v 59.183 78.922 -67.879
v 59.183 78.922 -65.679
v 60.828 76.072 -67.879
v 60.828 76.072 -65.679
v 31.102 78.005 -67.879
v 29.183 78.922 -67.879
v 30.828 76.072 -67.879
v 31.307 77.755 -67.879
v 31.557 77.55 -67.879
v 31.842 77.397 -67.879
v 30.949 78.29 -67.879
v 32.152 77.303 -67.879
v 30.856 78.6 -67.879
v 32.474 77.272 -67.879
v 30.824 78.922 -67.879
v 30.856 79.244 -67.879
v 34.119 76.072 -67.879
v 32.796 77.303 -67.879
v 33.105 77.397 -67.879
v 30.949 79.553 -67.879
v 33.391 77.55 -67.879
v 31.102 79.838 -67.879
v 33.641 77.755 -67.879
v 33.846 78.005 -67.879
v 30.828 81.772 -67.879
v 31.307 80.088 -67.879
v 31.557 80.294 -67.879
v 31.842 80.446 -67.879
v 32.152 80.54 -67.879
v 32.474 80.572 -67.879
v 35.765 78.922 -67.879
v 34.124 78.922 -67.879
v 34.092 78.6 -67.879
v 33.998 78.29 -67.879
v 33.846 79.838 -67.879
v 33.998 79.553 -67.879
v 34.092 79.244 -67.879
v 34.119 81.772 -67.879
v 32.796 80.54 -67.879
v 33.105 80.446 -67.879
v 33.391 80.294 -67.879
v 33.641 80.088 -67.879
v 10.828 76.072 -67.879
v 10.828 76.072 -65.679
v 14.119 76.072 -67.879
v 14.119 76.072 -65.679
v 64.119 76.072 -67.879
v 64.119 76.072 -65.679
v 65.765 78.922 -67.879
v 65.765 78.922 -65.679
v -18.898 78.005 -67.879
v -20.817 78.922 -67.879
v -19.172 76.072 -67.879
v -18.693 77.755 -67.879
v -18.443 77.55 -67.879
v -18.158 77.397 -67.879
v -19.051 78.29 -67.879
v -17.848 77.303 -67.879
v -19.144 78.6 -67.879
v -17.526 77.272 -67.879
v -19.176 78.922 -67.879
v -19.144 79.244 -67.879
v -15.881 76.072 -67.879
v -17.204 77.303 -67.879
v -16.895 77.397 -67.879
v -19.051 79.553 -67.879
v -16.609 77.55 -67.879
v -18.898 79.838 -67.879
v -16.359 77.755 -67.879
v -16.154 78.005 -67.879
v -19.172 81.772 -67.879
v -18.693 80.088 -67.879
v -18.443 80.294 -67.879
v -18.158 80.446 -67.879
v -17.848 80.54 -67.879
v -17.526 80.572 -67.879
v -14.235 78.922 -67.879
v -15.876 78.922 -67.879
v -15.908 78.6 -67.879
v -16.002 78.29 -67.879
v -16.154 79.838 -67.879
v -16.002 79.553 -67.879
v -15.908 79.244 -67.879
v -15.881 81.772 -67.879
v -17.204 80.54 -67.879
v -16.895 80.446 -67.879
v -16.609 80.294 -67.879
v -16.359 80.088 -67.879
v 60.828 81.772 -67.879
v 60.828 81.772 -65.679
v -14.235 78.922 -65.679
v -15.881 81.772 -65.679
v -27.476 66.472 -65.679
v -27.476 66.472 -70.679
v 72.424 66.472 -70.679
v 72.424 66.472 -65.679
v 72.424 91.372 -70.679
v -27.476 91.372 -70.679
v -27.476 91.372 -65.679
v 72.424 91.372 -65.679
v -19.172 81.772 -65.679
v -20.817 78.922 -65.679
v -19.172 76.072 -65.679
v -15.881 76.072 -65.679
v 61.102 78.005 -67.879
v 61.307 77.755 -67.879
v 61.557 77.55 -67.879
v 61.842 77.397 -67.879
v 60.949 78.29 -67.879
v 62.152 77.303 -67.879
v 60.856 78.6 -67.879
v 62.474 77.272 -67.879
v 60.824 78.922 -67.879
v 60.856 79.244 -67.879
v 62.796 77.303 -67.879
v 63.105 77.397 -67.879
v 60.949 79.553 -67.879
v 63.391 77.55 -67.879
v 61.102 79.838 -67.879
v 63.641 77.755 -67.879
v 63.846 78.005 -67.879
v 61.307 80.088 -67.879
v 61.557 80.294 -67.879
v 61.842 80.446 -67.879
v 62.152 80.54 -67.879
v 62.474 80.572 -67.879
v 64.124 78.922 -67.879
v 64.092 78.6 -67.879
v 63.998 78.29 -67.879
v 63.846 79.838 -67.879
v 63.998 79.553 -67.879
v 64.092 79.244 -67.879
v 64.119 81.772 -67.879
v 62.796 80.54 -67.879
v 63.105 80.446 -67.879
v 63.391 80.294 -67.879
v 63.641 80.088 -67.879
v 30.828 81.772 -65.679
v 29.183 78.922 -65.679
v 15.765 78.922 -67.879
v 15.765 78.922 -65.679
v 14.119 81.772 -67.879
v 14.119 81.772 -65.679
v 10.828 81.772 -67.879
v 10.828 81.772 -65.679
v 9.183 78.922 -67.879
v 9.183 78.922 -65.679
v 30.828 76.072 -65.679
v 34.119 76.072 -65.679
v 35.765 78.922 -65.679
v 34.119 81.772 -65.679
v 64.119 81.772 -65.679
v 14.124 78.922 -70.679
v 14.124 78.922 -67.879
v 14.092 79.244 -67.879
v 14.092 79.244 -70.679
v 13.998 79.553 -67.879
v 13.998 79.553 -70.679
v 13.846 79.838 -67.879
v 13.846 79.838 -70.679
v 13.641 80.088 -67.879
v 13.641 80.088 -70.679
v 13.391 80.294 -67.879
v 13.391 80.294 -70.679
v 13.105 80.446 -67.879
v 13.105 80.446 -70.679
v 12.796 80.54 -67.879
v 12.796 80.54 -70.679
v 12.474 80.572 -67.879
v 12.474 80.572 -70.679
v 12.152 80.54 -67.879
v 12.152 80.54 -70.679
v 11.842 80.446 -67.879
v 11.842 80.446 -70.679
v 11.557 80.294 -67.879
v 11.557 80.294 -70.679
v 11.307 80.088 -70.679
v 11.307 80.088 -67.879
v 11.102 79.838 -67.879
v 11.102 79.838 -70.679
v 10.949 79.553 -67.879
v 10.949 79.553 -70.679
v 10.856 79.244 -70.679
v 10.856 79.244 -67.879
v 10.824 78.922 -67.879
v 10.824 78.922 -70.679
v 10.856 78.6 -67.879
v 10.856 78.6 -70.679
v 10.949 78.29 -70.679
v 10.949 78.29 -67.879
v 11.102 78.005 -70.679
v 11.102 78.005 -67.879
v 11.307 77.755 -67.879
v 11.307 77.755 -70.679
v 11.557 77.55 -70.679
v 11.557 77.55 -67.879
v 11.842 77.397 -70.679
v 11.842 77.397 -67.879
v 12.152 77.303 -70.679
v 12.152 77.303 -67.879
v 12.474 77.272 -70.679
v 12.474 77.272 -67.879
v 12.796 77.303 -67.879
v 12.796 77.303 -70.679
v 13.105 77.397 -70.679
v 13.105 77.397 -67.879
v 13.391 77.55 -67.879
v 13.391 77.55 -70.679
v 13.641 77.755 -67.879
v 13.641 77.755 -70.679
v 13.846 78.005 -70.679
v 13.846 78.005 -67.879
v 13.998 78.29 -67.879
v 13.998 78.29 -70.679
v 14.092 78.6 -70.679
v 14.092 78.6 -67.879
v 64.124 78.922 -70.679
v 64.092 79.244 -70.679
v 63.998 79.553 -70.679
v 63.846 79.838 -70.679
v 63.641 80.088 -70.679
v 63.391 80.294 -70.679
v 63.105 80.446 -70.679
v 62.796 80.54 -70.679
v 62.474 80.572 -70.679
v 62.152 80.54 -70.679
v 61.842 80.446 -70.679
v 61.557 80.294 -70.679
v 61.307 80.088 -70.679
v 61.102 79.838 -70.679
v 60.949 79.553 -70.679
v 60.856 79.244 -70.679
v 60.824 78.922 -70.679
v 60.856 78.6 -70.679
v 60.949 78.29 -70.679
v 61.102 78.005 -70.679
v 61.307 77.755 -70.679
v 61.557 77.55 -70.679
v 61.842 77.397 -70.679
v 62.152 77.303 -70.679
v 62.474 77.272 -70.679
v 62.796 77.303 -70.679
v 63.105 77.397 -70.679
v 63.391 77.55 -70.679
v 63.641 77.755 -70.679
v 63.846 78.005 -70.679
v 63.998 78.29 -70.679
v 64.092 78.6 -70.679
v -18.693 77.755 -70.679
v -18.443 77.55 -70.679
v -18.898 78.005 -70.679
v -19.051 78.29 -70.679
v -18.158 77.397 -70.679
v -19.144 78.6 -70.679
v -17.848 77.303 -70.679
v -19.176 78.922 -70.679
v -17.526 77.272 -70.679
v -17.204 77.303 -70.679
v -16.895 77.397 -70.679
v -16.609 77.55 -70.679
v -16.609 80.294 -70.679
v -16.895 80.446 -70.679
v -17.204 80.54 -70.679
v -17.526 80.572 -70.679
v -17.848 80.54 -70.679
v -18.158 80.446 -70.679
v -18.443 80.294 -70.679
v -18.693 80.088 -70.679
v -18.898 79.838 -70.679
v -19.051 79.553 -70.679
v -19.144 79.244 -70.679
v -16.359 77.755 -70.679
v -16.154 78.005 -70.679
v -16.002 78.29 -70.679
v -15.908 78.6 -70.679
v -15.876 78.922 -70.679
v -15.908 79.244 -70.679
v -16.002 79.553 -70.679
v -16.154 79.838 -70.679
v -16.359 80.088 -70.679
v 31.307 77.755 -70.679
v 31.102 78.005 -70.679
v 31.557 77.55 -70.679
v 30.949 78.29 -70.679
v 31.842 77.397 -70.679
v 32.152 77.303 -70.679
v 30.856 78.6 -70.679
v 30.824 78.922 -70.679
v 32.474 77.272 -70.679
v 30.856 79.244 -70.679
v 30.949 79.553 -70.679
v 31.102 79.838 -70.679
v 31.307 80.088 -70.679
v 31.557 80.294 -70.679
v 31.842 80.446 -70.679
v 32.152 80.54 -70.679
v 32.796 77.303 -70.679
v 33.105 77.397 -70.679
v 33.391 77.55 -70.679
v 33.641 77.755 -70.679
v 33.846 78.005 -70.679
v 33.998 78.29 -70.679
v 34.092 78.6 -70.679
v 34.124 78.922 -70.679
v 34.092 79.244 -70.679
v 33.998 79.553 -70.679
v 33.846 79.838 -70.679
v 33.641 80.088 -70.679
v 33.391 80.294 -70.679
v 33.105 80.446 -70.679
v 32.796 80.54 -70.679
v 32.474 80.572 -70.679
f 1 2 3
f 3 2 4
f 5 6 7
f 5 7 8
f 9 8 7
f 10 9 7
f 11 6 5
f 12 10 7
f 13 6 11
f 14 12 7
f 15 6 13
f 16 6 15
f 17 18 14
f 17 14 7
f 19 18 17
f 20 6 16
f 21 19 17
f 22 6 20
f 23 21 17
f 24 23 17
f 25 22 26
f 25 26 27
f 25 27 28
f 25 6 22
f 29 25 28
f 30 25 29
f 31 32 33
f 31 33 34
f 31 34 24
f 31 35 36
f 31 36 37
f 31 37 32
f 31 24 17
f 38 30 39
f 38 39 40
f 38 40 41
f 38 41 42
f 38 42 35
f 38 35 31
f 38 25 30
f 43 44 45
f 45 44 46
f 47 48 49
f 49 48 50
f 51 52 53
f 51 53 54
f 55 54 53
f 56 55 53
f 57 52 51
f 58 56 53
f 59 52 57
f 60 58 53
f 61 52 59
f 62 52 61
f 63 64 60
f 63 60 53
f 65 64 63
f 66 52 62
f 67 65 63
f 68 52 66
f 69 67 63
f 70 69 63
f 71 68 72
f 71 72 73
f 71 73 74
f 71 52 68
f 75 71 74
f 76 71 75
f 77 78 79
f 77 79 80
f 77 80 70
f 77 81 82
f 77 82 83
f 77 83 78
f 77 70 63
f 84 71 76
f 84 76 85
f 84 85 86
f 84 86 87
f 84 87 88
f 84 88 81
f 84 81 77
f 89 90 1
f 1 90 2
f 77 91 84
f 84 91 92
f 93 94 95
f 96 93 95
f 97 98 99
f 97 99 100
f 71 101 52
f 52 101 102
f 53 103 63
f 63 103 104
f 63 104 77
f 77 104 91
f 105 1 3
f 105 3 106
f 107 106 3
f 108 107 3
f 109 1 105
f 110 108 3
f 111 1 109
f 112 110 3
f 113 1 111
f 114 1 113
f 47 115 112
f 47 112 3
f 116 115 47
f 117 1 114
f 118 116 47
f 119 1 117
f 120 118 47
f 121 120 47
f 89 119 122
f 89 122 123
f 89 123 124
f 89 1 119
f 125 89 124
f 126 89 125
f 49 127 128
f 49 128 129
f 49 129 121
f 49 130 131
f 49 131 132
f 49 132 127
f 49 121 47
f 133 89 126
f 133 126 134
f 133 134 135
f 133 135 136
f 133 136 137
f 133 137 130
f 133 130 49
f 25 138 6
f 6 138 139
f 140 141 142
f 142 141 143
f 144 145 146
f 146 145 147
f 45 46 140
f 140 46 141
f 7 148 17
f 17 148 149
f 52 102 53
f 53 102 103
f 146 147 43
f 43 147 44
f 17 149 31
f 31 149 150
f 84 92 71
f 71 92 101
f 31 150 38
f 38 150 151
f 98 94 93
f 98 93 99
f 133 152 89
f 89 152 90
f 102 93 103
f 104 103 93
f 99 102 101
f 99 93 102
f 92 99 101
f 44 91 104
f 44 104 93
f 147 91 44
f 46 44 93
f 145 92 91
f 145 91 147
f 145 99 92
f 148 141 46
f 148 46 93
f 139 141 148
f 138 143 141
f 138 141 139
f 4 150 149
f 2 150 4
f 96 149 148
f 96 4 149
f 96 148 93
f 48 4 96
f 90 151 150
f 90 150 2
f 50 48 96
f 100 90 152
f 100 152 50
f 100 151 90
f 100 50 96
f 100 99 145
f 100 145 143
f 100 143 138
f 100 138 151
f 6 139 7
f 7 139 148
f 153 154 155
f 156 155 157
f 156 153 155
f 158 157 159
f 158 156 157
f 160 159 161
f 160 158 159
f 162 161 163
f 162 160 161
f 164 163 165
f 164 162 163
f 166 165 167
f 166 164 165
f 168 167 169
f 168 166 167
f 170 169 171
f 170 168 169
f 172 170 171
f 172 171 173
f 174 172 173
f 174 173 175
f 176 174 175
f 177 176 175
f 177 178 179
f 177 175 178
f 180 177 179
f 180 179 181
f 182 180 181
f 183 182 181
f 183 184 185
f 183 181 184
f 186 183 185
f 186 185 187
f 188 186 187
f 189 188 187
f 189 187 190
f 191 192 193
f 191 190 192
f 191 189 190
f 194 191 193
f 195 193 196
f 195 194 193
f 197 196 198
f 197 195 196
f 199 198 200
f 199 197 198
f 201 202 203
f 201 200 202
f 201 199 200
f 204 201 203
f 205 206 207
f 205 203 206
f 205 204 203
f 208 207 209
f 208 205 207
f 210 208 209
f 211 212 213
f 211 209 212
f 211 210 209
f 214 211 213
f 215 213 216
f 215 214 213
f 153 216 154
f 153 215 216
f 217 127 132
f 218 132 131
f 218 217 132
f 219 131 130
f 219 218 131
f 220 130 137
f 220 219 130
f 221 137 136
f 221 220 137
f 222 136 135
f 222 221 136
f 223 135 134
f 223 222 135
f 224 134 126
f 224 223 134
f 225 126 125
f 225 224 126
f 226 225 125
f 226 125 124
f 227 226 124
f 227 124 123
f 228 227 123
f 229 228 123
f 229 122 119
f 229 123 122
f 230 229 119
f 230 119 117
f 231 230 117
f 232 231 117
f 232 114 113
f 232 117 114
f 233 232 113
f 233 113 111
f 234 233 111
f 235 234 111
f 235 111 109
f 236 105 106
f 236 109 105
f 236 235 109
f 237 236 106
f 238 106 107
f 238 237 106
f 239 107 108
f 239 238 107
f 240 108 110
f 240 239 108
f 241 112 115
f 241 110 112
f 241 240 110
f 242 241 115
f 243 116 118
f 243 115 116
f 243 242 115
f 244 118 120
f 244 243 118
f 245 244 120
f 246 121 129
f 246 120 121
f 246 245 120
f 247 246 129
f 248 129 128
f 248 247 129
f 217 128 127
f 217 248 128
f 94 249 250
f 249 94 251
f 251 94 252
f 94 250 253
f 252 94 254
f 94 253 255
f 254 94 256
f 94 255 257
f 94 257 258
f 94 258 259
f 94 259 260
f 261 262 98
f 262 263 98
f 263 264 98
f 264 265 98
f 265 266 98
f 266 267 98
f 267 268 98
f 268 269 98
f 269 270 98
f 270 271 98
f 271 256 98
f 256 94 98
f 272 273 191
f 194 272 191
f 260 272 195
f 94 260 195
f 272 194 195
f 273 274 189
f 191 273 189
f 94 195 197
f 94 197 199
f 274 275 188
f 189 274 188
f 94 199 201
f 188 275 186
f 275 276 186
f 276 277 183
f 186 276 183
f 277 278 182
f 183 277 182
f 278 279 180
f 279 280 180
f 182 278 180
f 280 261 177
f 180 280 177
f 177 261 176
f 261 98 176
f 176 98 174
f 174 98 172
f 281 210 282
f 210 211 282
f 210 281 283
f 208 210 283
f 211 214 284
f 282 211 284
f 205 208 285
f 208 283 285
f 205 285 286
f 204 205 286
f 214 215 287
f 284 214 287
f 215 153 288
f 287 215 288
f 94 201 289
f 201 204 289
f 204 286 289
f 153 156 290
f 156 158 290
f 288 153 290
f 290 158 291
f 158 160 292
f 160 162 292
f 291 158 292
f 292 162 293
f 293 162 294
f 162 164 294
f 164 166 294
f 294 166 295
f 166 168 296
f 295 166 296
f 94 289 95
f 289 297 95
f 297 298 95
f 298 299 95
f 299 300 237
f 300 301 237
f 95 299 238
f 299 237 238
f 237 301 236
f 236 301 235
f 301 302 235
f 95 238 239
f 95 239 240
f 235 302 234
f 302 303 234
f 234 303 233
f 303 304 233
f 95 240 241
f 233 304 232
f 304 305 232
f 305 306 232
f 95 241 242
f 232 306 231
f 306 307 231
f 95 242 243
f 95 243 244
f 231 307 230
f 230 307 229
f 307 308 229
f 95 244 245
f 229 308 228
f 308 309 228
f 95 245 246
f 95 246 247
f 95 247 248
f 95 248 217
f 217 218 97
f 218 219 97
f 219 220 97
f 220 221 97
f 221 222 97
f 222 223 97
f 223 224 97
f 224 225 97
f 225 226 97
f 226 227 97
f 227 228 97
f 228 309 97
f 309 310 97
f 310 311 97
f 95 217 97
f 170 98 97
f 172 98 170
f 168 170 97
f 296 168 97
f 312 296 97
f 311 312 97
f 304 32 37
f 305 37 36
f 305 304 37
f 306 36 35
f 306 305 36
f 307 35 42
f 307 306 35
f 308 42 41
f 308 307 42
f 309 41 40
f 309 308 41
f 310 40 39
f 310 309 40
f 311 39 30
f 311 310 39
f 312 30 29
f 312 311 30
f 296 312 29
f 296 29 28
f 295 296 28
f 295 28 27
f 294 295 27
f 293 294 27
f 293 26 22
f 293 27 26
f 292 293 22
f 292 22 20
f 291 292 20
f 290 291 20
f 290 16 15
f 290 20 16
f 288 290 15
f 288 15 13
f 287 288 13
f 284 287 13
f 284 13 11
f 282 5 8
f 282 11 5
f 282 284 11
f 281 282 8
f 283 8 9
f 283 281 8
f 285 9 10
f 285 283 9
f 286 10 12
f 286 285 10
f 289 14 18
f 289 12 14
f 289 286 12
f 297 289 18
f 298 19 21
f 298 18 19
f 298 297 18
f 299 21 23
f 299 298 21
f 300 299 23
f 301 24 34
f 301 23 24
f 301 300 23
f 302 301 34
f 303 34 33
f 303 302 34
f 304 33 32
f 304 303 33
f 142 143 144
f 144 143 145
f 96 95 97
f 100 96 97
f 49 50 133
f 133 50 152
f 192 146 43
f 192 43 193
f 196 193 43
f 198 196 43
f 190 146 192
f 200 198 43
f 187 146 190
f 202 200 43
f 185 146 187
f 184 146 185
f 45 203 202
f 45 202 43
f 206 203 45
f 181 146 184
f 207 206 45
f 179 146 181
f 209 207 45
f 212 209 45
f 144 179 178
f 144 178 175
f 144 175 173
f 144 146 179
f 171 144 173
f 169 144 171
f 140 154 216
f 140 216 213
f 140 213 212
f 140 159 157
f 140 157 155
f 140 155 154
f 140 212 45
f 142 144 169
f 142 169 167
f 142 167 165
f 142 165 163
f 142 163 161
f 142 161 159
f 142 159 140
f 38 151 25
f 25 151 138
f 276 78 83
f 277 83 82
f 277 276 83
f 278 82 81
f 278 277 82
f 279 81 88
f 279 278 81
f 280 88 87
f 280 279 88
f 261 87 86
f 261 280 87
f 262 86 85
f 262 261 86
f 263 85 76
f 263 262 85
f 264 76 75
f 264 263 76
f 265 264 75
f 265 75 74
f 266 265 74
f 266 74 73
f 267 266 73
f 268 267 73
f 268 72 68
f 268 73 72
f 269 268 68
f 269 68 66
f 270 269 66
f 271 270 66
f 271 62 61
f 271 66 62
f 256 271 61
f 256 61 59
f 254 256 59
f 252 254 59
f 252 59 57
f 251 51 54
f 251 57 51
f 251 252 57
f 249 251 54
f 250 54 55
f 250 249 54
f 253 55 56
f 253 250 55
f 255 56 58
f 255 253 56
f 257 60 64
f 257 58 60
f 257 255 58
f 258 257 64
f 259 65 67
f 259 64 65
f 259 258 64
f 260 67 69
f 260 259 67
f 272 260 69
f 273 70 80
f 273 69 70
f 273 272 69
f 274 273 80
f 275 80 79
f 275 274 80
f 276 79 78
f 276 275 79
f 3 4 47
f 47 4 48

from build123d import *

# Parameters (mm, degrees)
SKETCH1_W           = 99.9
SKETCH1_H           = 24.9
SKETCH1_R           = 1.65
BOSS_EXTRUDE1_DEPTH = 5
CUT_EXTRUDE1_DEPTH  = 2.2


with BuildPart() as part:
    # Sketch1 → Boss-Extrude1 (new body)
    with BuildSketch(Plane.XY.offset(-70.679368873)):
        with Locations((22.473815584, 78.921604181)):
            Rectangle(SKETCH1_W, SKETCH1_H)
        with Locations((-17.526184416, 78.921604181)):
            Circle(SKETCH1_R, mode=Mode.SUBTRACT)
        with Locations((12.473815584, 78.921604181)):
            Circle(SKETCH1_R, mode=Mode.SUBTRACT)
        with Locations((32.473815584, 78.921604181)):
            Circle(SKETCH1_R, mode=Mode.SUBTRACT)
        with Locations((62.473815584, 78.921604181)):
            Circle(SKETCH1_R, mode=Mode.SUBTRACT)
    extrude(amount=BOSS_EXTRUDE1_DEPTH)

    # Sketch2 → Cut-Extrude1 (cut)
    with BuildSketch(Plane.XY.offset(-65.679368873)):
        Polygon((-15.880736149, 76.071604181), (-14.235287881, 78.921604181), (-15.880736149, 81.771604181), (-19.171632683, 81.771604181), (-20.81708095, 78.921604181), (-19.171632683, 76.071604181), align=None)
        Polygon((14.119263851, 76.071604181), (15.764712119, 78.921604181), (14.119263851, 81.771604181), (10.828367317, 81.771604181), (9.18291905, 78.921604181), (10.828367317, 76.071604181), align=None)
        Polygon((34.119263851, 76.071604181), (35.764712119, 78.921604181), (34.119263851, 81.771604181), (30.828367317, 81.771604181), (29.18291905, 78.921604181), (30.828367317, 76.071604181), align=None)
        Polygon((64.119263851, 76.071604181), (65.764712119, 78.921604181), (64.119263851, 81.771604181), (60.828367317, 81.771604181), (59.18291905, 78.921604181), (60.828367317, 76.071604181), align=None)
    extrude(amount=-CUT_EXTRUDE1_DEPTH, mode=Mode.SUBTRACT)


solid = part.part
